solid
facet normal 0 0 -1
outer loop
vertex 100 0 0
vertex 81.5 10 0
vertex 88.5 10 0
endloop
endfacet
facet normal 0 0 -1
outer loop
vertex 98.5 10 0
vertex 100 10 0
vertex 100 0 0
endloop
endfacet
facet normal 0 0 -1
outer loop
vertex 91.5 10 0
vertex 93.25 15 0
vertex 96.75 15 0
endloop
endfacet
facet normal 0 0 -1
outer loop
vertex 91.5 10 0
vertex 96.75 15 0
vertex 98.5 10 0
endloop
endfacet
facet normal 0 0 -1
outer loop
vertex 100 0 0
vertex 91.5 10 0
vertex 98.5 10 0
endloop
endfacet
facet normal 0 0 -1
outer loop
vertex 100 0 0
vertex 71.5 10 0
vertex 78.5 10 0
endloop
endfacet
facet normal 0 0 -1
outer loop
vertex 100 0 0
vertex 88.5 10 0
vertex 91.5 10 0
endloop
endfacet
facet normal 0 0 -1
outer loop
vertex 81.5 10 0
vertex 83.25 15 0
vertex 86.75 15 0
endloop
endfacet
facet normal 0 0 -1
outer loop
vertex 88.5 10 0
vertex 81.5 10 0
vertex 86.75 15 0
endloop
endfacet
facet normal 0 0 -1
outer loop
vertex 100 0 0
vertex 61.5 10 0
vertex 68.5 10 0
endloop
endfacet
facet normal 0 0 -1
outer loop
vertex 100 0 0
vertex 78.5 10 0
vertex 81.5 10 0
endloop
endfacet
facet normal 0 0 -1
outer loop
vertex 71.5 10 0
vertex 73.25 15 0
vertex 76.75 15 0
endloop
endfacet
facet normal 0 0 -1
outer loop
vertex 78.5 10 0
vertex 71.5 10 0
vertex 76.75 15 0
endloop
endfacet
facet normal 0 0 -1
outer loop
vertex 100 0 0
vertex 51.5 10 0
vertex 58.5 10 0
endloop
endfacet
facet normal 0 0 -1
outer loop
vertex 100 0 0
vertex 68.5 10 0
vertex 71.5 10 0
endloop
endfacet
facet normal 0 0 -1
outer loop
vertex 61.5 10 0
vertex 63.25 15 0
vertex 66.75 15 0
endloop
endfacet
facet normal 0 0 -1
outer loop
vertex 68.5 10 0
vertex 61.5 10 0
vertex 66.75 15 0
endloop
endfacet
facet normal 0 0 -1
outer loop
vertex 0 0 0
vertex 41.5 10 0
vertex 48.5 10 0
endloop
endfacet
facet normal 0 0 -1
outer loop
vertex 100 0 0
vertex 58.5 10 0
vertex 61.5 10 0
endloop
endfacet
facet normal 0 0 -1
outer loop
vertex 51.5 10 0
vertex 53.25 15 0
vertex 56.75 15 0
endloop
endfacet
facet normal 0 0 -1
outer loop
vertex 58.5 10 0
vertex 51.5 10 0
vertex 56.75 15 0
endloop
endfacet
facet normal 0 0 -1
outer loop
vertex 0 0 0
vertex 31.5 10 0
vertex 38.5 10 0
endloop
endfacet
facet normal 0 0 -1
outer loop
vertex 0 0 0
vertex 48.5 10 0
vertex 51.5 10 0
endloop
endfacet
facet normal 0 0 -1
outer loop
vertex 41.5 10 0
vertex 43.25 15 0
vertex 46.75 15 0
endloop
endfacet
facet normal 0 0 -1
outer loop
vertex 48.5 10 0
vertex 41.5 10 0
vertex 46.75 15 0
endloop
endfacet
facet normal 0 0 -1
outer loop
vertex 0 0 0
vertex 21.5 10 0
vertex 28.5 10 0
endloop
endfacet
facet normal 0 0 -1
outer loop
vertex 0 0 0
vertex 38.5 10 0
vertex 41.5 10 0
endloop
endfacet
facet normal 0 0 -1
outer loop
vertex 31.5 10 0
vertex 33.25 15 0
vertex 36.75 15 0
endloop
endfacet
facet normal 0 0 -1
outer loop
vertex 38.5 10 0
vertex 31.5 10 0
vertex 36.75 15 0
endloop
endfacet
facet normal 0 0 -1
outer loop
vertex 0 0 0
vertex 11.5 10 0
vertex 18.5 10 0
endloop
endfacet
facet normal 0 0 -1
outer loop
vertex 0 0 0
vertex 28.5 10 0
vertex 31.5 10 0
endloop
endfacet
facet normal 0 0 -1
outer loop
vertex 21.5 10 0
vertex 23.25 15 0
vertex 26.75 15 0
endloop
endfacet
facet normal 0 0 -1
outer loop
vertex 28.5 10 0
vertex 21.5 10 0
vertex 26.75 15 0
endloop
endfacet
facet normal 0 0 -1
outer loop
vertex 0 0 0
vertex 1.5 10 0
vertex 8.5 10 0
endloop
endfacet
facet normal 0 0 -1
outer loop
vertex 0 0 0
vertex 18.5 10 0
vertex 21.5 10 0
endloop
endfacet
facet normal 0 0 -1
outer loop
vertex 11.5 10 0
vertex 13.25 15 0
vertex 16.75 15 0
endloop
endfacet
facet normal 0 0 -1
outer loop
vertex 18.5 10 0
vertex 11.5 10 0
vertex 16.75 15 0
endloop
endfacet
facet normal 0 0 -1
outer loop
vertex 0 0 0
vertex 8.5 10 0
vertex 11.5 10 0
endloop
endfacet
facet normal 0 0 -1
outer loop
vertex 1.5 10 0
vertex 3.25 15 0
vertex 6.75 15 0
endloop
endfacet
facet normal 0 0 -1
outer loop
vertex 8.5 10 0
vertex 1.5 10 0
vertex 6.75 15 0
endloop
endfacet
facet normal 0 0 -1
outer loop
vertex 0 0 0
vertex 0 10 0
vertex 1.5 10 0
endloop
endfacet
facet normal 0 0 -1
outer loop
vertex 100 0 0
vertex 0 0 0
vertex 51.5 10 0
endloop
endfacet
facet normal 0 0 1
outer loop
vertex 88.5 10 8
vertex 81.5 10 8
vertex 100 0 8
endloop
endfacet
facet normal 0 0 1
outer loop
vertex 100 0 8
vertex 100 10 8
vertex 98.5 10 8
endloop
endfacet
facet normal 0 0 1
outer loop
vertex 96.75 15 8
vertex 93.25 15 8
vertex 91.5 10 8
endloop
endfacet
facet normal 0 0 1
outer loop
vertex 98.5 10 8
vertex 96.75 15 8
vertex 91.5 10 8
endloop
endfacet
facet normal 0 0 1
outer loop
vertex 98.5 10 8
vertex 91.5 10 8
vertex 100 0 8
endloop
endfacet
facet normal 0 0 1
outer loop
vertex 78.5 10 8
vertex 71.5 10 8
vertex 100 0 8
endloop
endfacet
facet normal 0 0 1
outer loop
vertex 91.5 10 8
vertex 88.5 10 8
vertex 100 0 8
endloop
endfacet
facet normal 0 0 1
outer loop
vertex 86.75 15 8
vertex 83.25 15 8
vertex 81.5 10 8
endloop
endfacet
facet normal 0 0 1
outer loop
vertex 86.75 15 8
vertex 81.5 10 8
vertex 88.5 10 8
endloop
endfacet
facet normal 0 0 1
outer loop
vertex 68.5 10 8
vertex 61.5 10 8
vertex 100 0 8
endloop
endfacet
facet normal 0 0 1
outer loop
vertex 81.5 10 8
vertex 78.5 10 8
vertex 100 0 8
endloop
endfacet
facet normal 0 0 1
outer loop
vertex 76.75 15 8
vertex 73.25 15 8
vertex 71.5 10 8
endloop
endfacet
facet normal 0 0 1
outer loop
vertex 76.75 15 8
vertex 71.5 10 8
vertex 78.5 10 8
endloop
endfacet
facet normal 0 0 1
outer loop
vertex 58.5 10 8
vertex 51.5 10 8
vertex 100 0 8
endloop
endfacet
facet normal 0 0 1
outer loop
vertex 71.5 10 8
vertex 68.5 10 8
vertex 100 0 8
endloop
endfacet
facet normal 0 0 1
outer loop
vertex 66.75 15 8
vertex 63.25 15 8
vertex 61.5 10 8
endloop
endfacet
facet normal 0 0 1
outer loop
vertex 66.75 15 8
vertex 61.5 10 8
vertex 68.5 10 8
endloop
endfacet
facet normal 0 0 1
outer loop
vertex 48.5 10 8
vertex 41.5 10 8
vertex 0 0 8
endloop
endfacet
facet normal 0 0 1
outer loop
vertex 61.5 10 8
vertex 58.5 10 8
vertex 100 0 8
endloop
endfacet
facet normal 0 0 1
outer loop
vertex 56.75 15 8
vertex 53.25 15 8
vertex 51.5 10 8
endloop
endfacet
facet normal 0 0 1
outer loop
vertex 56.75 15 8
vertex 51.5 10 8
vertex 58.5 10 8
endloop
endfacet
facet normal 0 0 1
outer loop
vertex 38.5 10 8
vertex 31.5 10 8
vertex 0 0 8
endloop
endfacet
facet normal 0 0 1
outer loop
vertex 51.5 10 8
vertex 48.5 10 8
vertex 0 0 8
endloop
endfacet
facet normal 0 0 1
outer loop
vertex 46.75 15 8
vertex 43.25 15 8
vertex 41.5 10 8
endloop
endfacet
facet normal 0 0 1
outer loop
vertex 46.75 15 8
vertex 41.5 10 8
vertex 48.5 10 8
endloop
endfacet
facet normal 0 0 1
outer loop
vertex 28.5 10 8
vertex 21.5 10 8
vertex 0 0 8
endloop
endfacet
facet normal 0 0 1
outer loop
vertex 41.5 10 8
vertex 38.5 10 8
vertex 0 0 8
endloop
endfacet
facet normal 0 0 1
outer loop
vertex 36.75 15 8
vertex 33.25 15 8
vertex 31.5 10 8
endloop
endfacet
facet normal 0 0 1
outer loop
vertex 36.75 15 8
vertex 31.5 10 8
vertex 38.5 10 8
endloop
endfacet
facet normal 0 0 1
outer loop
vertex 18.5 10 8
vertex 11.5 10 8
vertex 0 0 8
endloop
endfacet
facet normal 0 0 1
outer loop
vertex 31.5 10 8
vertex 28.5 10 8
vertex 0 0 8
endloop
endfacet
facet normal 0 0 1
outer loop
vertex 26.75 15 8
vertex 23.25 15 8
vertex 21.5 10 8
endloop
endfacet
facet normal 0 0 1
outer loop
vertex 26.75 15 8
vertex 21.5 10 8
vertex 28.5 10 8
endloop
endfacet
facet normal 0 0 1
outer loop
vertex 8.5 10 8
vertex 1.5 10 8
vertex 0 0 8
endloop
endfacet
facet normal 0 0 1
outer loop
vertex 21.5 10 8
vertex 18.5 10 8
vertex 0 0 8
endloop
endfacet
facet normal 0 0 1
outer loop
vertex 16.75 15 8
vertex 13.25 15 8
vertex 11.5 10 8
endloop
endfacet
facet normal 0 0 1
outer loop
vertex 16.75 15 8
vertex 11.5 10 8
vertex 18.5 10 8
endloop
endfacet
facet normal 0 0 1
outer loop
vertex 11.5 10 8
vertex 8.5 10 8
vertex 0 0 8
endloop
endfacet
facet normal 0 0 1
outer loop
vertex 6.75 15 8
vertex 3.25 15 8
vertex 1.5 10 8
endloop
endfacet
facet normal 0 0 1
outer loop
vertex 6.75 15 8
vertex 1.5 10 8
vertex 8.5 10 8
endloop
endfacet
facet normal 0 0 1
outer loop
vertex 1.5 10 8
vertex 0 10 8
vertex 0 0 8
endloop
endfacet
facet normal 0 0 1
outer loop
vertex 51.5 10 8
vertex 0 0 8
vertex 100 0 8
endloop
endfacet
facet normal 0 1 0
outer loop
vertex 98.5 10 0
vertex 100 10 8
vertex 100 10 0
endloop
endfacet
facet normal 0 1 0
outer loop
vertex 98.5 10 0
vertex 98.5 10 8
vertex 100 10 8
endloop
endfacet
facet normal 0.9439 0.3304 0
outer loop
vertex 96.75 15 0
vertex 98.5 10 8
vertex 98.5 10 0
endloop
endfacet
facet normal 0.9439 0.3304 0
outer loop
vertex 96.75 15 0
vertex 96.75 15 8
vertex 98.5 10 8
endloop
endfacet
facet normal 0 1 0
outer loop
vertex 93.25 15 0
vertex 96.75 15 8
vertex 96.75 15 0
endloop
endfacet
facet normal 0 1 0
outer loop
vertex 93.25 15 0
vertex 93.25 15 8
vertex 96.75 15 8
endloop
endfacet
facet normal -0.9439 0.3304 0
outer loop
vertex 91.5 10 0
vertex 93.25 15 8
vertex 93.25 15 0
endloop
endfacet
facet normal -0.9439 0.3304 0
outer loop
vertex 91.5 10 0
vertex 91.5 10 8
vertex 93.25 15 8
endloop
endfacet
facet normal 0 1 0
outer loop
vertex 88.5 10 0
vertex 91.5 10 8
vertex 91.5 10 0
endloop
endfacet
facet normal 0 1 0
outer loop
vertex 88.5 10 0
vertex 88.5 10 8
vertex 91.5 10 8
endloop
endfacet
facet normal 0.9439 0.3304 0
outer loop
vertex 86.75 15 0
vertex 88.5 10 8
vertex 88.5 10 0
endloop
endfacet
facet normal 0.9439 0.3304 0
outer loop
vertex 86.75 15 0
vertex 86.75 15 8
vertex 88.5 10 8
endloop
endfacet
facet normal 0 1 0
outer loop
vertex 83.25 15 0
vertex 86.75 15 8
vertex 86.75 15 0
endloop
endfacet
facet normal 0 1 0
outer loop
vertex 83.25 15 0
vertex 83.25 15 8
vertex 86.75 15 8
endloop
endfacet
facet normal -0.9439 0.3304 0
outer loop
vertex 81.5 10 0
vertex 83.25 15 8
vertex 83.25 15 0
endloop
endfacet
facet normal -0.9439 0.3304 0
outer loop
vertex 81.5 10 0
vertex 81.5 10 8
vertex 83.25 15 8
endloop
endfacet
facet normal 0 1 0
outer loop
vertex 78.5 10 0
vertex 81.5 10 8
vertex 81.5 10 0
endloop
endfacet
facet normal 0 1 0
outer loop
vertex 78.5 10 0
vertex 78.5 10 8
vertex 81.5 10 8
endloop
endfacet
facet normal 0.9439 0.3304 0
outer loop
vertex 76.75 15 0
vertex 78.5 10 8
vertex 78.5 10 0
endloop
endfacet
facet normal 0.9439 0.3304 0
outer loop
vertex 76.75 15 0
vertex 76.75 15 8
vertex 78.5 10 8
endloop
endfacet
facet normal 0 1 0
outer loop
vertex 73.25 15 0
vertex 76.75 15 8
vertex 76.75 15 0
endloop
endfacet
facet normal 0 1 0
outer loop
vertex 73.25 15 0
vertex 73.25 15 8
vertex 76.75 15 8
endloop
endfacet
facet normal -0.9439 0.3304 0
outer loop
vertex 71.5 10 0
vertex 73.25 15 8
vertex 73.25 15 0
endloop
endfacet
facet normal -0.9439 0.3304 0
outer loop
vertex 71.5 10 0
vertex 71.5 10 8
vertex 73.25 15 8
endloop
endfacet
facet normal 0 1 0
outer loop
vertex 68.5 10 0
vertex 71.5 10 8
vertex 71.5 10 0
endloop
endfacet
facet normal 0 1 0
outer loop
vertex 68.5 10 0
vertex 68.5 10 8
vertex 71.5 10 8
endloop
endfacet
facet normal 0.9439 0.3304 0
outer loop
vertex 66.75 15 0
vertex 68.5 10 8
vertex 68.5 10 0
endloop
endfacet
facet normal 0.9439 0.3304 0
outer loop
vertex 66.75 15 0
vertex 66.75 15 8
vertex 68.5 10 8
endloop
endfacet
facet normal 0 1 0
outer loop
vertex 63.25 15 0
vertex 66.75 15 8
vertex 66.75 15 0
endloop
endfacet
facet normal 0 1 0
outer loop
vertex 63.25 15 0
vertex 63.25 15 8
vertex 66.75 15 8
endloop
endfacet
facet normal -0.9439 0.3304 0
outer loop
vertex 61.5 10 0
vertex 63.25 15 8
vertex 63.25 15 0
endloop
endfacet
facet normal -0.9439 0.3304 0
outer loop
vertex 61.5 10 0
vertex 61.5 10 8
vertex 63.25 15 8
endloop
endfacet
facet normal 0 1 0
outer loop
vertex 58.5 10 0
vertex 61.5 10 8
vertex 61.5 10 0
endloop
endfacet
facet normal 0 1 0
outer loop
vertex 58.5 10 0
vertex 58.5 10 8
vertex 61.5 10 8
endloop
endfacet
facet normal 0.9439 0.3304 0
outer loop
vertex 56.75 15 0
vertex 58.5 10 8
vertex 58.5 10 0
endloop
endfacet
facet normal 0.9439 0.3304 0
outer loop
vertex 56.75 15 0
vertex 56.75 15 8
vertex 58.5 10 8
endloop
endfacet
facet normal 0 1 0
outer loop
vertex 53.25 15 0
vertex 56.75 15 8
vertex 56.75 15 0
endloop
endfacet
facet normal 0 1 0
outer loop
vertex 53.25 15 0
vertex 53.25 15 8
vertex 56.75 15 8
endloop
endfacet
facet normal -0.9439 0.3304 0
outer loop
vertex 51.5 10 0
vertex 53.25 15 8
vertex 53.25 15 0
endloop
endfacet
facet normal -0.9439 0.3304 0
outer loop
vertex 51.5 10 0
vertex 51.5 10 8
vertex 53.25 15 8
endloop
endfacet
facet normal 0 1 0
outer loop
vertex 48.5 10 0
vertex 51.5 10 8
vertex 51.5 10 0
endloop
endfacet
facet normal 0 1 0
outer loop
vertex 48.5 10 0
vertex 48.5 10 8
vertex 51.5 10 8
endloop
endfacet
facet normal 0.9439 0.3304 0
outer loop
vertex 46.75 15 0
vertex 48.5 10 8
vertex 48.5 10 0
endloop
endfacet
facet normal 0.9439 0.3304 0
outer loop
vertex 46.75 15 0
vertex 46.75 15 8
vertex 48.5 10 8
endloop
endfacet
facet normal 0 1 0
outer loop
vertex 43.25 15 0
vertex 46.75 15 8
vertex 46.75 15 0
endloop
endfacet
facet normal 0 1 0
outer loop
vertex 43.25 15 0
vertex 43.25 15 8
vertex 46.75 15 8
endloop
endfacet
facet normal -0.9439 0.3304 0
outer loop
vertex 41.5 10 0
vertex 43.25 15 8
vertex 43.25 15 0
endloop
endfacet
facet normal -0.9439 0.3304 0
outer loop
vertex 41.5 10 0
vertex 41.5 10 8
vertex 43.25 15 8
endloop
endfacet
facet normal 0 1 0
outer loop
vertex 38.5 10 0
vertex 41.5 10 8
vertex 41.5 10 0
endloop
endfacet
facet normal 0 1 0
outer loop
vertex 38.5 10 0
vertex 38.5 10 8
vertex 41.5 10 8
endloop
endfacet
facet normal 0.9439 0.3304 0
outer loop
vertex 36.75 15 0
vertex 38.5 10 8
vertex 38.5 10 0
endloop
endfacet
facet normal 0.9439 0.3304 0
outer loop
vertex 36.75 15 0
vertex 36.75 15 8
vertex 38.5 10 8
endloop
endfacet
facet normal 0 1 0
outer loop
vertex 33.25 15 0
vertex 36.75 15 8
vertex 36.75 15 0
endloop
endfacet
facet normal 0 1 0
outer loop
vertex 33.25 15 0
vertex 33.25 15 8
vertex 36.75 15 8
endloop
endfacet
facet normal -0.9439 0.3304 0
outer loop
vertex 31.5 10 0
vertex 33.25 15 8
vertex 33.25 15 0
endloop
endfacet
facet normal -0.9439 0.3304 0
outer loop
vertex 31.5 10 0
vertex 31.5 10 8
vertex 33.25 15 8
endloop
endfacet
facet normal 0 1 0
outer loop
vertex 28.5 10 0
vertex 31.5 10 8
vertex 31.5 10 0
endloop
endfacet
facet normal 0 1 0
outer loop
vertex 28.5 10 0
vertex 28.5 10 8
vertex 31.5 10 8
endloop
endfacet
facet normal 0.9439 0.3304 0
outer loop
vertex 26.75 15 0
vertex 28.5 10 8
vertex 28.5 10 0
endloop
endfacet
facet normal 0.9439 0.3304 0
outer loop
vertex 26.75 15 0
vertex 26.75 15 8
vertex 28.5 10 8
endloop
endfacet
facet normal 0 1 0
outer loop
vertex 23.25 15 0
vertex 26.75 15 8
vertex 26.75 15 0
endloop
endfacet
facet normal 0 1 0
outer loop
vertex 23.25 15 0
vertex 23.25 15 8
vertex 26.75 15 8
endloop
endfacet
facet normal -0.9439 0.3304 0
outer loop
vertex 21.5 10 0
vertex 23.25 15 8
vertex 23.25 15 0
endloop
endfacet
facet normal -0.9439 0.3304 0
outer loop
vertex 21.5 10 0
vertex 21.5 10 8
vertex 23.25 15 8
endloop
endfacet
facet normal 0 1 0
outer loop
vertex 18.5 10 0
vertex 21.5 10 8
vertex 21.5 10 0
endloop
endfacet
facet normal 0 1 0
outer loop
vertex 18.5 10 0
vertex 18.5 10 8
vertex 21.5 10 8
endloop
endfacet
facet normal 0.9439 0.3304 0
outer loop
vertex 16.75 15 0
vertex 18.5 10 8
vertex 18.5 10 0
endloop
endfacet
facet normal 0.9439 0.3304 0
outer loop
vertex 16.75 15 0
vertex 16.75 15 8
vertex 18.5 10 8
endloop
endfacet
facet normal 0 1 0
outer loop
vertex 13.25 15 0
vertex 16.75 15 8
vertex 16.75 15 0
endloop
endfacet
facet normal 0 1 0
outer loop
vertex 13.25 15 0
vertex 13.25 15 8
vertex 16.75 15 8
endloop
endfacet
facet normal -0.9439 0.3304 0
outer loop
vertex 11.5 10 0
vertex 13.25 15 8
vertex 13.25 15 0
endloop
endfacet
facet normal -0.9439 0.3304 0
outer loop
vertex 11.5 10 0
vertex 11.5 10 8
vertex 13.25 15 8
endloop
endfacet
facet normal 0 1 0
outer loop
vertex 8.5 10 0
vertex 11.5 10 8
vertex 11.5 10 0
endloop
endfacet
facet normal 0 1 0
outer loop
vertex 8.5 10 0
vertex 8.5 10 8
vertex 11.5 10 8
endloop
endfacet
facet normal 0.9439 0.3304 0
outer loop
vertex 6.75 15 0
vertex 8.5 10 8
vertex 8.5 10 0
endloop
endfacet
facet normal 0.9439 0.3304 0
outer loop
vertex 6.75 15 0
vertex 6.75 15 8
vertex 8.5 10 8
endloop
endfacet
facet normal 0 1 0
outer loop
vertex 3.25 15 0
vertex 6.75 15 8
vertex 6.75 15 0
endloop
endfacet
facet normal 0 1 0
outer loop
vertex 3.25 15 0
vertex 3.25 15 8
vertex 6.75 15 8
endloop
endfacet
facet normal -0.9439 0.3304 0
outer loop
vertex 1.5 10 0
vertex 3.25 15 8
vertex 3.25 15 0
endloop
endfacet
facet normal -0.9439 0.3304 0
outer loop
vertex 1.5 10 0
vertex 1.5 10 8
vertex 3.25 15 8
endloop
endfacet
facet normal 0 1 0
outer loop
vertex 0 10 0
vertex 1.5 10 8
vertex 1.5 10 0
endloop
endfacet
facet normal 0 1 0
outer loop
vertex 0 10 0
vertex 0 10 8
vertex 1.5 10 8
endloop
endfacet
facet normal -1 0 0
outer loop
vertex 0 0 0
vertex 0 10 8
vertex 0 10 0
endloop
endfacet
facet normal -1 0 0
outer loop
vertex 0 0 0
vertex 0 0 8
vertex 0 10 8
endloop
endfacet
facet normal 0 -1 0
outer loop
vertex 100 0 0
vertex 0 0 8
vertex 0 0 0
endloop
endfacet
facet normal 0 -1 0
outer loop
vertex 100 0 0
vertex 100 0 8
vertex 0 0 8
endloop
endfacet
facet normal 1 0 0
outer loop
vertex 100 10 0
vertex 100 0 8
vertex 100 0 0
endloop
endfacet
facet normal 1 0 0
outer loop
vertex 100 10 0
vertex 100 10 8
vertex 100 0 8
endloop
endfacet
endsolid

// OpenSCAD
$fn = 32;

// ----------------------------------------------------------------------
// Gear rack: 10 teeth, pitch 10 mm
// ----------------------------------------------------------------------

// --- parameters (mm) ---
teeth = 10;               // number of teeth
pitch = 10;               // tooth pitch, X
root_w = 7;               // tooth width at the root
tip_w = 3.5;              // tooth width at the tip
base_h = 10;              // rack body height, Y
tooth_h = 5;              // tooth height above the body
plate_t = 8;              // rack width, Z (extrusion height)
fit_tol = 0.05;           // declared fit tolerance (prompt contract)
free_tol = 0.2;           // declared free tolerance (prompt contract)

rack_l = teeth * pitch;  // overall length
total_h = base_h + tooth_h;  // overall height

profile = [[0, 0], [100, 0], [100, 10], [98.5, 10], [96.75, 15], [93.25, 15], [91.5, 10], [88.5, 10], [86.75, 15], [83.25, 15], [81.5, 10], [78.5, 10], [76.75, 15], [73.25, 15], [71.5, 10], [68.5, 10], [66.75, 15], [63.25, 15], [61.5, 10], [58.5, 10], [56.75, 15], [53.25, 15], [51.5, 10], [48.5, 10], [46.75, 15], [43.25, 15], [41.5, 10], [38.5, 10], [36.75, 15], [33.25, 15], [31.5, 10], [28.5, 10], [26.75, 15], [23.25, 15], [21.5, 10], [18.5, 10], [16.75, 15], [13.25, 15], [11.5, 10], [8.5, 10], [6.75, 15], [3.25, 15], [1.5, 10], [0, 10]];  // primary outline, 44 points, counter clockwise

// --- the one profile operation ---
linear_extrude(height = plate_t) polygon(points = profile);
